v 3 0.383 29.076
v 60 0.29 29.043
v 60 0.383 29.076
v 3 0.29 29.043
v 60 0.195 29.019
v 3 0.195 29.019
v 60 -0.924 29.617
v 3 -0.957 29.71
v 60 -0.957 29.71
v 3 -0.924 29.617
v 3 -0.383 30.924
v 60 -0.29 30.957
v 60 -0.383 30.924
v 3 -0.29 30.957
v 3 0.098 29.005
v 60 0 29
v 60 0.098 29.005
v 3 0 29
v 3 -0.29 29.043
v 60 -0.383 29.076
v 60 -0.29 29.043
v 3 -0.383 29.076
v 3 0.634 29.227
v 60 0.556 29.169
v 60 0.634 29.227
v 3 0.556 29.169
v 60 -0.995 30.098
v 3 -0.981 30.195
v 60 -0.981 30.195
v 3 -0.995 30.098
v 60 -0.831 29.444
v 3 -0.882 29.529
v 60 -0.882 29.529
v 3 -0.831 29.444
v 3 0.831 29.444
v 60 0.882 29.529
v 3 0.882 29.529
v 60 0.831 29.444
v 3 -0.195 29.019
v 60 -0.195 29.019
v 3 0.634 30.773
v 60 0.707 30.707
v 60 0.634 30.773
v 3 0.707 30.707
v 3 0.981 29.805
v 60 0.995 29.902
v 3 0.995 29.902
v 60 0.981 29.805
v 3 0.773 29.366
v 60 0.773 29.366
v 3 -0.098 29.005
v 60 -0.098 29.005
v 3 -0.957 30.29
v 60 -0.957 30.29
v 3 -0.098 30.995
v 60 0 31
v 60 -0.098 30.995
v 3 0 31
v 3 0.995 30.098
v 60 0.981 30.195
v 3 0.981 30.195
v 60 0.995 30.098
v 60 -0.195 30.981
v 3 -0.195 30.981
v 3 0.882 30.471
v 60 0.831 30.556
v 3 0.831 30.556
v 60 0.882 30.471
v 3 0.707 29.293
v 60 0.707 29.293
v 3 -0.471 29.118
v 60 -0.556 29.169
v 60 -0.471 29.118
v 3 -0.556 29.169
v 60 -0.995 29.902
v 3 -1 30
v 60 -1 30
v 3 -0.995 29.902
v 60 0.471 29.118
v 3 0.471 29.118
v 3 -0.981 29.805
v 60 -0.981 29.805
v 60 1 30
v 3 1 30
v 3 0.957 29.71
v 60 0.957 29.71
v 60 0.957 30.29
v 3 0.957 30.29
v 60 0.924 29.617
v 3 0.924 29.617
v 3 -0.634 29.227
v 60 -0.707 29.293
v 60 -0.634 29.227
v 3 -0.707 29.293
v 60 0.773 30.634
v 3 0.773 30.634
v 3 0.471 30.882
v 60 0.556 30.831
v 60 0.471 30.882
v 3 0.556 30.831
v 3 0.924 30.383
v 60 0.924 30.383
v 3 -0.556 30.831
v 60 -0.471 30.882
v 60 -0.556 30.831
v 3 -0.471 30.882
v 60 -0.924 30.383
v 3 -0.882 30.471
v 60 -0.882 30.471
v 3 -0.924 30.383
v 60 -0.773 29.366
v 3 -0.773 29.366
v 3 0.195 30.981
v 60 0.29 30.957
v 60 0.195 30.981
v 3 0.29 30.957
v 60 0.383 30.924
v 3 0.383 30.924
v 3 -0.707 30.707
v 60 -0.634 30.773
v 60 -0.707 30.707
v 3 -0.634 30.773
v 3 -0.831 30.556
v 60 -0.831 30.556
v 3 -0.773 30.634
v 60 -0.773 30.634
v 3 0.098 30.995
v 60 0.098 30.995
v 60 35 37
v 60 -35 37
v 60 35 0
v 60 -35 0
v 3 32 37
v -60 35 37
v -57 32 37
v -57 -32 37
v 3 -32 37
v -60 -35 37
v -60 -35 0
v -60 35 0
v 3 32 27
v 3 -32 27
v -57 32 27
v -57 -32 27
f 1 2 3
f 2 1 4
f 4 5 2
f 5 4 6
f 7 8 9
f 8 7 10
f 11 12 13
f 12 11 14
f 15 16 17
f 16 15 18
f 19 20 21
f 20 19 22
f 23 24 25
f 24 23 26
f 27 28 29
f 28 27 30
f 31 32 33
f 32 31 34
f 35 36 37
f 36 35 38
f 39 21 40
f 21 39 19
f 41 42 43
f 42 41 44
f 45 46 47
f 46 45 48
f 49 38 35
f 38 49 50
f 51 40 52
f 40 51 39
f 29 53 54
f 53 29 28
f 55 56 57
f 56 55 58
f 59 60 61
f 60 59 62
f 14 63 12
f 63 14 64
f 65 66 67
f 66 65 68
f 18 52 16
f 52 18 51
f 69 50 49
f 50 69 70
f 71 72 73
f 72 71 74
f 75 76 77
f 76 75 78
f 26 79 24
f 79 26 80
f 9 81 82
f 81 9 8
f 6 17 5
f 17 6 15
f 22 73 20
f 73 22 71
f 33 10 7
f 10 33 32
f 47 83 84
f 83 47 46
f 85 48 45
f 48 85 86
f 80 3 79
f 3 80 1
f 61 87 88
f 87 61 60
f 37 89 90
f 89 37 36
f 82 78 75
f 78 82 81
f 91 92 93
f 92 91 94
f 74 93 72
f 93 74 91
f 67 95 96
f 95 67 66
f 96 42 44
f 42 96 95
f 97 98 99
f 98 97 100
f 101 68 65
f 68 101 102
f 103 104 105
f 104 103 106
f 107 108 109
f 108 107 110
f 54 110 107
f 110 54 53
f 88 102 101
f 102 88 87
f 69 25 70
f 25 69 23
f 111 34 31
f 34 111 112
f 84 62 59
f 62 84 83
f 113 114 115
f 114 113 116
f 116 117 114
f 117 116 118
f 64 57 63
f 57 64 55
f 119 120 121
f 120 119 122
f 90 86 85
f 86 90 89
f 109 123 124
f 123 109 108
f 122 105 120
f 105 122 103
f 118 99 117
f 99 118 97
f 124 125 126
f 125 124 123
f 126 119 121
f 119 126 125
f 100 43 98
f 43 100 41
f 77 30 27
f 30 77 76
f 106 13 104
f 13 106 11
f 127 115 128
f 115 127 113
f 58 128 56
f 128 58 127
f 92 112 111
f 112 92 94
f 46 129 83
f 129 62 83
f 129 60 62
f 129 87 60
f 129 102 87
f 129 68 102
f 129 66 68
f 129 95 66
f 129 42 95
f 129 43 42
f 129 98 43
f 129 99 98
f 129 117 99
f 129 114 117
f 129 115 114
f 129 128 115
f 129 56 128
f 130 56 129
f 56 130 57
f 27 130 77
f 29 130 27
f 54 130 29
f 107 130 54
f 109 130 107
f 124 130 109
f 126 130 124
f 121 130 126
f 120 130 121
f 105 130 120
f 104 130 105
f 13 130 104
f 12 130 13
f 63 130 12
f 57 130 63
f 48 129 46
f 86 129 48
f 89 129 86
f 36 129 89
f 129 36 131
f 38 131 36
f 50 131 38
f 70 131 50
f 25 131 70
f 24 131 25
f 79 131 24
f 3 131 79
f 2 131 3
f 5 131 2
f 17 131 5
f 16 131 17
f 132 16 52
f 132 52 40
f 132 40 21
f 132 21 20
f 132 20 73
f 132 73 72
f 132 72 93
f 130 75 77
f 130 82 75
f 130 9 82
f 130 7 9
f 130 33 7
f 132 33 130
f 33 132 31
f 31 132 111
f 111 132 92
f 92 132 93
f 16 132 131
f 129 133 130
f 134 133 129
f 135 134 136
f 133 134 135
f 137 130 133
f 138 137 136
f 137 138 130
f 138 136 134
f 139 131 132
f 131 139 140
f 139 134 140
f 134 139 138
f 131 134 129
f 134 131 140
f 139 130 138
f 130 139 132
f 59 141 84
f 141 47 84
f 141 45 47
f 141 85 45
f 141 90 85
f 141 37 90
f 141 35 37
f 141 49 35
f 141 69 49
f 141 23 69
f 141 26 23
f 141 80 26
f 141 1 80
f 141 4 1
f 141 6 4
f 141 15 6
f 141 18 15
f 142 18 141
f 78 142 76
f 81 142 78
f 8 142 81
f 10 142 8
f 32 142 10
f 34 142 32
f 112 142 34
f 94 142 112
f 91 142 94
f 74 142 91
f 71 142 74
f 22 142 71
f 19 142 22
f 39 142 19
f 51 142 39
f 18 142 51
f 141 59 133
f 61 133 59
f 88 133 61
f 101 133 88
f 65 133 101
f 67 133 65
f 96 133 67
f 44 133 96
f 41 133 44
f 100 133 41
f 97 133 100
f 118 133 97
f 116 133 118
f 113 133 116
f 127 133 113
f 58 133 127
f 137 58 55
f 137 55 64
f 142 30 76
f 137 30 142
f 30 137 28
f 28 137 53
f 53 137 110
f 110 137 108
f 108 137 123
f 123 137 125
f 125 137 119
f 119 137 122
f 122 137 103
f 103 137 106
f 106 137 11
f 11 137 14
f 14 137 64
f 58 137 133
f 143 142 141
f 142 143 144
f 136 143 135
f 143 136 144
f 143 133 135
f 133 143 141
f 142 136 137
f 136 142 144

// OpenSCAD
// Buffer tank for mini horizontal gel-electrophoresis box
// Print orientation: open top facing +Z, resting on XY plane at z = 0

// ---------------- Parameters ----------------
outer_x   = 120;   // outer length in X
outer_y   = 70;    // outer width in Y
outer_z   = 40;    // outer height in Z
wall      = 3;     // wall thickness
floor     = 3;     // floor thickness

inner_h   = outer_z - wall - floor;   // inner height of tank (34)
platform_t = 10;                      // platform thickness (top at z = 13)
platform_x = 60;                      // platform length in X, centred
hole_d     = 2;                       // electrode hole diameter
hole_y     = 0;                       // electrode hole Y position
hole_z     = 30;                      // electrode hole Z position

eps       = 0.5;                      // cutter overshoot past faces
$fn       = 64;                       // curve resolution

// ---------------- Derived ----------------
inner_w = outer_y - 2 * wall;         // inner width (64)
inner_l = outer_x - 2 * wall;         // inner length (114)
chamber_h = inner_h - platform_t;     // chamber height above platform (24)

// ---------------- Model ----------------
difference() {
    // Main tank body (open top)
    translate([-outer_x/2, -outer_y/2, 0])
        cube([outer_x, outer_y, outer_z - wall]);

    // Gel-tray platform, raised above inner floor
    translate([-outer_x/2 + wall, -inner_w/2, floor + chamber_h])
        cube([platform_x, inner_w, platform_t]);

    // Horizontal electrode holes through each end wall along X
    for (s = [-1, 1])
        translate([s * (inner_l/2 - hole_d/2 - eps), hole_y, hole_z])
            rotate([0, 90, 0])
                cylinder(d = hole_d, h = inner_l + 2*eps + wall);
}
